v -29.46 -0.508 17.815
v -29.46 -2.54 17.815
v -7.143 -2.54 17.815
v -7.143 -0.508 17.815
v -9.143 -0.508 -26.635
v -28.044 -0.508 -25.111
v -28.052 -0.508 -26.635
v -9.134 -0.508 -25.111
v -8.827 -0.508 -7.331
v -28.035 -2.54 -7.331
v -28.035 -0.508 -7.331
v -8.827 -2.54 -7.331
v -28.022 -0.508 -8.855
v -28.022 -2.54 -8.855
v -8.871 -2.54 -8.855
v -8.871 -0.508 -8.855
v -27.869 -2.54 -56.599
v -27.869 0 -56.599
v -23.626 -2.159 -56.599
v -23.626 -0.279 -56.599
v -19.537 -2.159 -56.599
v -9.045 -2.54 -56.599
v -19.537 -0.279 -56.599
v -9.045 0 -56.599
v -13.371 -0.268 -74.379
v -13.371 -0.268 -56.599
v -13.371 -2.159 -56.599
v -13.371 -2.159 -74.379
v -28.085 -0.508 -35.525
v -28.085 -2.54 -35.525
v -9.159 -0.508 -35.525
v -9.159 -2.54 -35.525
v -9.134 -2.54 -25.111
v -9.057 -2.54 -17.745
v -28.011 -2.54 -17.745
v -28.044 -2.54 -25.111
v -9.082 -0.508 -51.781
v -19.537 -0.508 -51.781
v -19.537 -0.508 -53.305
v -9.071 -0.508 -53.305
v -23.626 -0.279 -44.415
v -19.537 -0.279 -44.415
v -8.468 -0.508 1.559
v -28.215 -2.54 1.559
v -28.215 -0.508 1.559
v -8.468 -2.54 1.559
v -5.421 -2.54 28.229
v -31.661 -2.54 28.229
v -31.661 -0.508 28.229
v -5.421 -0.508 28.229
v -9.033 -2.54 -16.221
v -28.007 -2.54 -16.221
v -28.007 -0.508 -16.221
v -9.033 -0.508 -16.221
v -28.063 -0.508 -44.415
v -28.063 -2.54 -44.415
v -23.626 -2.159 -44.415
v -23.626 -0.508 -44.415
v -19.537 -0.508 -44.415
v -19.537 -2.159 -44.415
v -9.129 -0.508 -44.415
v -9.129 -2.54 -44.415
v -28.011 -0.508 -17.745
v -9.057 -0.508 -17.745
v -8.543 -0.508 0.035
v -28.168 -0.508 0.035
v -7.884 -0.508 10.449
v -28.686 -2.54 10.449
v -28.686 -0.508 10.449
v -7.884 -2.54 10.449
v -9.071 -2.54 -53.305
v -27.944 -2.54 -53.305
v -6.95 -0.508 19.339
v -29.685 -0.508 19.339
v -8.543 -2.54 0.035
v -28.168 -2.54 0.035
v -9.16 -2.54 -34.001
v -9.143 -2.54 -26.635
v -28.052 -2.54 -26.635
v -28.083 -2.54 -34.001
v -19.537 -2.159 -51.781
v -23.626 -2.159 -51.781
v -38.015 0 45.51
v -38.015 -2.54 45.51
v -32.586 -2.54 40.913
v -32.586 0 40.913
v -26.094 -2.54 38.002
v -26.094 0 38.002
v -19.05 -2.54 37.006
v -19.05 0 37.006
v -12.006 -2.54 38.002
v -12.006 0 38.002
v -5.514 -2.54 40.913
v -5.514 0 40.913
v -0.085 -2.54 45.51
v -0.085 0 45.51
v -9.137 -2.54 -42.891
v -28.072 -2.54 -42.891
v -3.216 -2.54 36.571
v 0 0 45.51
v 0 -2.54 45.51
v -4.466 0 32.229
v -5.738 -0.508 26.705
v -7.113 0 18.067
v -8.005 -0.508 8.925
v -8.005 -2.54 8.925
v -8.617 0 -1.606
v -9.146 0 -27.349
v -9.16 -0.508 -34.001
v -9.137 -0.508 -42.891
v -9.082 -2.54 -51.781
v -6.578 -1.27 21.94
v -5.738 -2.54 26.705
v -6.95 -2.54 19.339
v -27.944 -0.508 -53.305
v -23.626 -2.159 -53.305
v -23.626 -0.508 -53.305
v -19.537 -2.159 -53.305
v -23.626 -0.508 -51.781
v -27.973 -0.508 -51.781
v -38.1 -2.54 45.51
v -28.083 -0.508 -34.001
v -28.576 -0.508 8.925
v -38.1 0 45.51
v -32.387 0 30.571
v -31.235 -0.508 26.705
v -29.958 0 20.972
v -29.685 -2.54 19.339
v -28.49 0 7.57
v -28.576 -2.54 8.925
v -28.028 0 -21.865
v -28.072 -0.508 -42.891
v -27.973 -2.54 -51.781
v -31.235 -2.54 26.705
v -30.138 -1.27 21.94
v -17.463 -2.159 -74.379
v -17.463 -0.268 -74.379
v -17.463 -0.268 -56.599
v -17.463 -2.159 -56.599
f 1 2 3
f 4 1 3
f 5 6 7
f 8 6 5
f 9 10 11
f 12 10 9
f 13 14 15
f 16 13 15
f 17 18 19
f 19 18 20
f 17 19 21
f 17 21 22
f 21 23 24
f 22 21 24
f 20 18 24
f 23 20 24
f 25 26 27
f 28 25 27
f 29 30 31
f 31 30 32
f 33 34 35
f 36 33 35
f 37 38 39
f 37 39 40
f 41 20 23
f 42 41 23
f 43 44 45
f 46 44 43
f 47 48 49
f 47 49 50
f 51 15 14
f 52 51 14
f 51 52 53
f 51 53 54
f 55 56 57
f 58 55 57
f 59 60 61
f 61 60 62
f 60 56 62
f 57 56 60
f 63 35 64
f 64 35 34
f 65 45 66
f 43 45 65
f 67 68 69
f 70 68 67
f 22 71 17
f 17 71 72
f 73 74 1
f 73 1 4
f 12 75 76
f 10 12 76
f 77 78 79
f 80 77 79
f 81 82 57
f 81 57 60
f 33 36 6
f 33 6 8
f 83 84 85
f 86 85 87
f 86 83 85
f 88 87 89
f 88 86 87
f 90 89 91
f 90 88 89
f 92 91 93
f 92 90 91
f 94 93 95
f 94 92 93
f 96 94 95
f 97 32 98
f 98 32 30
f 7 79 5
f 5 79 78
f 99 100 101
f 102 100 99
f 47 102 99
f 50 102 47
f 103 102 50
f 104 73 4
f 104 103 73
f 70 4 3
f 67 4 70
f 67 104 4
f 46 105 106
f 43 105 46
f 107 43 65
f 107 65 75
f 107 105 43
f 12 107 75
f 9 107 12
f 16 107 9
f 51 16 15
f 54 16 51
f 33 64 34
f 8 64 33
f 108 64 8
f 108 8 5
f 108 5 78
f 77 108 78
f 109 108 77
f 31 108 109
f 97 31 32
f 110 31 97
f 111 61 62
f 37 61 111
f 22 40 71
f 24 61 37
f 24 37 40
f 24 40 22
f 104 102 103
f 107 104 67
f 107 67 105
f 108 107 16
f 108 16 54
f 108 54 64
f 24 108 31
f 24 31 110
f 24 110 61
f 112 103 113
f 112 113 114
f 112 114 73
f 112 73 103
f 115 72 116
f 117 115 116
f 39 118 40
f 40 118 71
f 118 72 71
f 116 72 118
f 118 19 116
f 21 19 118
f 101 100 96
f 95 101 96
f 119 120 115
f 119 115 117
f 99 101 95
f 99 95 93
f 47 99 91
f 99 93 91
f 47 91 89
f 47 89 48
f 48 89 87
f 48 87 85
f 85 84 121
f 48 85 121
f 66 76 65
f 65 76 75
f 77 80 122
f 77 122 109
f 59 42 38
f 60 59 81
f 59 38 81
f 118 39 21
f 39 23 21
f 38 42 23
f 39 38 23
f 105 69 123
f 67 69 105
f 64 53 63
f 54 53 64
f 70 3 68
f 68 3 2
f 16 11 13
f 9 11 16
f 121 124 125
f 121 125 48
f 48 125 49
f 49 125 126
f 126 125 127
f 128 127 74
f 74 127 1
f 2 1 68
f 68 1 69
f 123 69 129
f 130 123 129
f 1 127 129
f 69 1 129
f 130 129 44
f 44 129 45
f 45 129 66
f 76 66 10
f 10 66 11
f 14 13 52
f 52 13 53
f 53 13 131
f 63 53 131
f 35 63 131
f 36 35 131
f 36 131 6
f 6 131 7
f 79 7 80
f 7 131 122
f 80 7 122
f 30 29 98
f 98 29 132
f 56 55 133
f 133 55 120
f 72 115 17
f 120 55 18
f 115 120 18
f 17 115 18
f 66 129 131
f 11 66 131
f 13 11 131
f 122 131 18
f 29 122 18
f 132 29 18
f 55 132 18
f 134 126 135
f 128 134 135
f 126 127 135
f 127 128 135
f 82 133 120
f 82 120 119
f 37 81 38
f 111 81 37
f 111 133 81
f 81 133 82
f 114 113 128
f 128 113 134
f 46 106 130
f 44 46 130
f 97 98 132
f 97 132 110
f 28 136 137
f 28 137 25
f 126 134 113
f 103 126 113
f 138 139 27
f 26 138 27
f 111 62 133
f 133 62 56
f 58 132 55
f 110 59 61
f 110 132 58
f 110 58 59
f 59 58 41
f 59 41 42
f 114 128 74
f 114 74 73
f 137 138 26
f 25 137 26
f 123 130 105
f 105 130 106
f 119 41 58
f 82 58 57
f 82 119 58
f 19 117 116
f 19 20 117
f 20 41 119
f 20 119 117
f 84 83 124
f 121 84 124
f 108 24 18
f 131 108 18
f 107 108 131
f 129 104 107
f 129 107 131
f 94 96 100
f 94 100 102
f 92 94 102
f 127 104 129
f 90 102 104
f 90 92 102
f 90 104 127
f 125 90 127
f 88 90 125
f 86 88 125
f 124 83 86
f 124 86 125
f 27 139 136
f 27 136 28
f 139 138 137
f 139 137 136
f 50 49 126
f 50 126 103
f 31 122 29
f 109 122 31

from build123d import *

# Parameters (mm, degrees)
F1_DEPTH = 2.54
F2_R     = 25.4
F3_DEPTH = 25.4
F4_W     = 41.0972163081
F4_H     = 1.524
F5_DEPTH = 2.032
F6_W     = 4.0921838954
F6_H     = 1.8910848594
F7_DEPTH = 17.78
F8_W     = 4.0894
F8_H     = 1.8796
F9_DEPTH = 12.183920388


with BuildPart() as f1:
    # F0 (on Front) → F1 (new body)
    with BuildSketch(Plane.XZ):
        with BuildLine():
            add(Edge.make_bspline(
                [(-38.1, 45.5098064329), (-31.48906723, 40.6018618943), (-18.4296945804, 30.9066072453), (-6.0920606717, 40.6826197932), (0, 45.5098064329)],
                knots=[0, 0, 0, 0, 0.506221313, 1, 1, 1, 1], degree=3))
            add(Edge.make_bspline(
                [(-38.1, 45.5098064329), (-35.7981584888, 38.8964609268), (-25.5149174178, 20.0096712829), (-28.6912827149, -24.7501280377), (-27.8687996008, -56.598869547)],
                knots=[0, 0, 0, 0, 0.3600810606, 1, 1, 1, 1], degree=3))
            Line((-27.8687996008, -56.598869547), (-9.0453229023, -56.598869547))
            add(Edge.make_bspline(
                [(0, 45.5098064329), (-2.5833212801, 38.9747758696), (-9.3977049962, 19.6461118957), (-9.3031082968, -24.5379434481), (-9.0453229023, -56.598869547)],
                knots=[0, 0, 0, 0, 0.3581705323, 1, 1, 1, 1], degree=3))
        make_face()
        with BuildLine():
            Line((0, 45.5098064329), (-38.1, 45.5098064329))
            add(Edge.make_bspline(
                [(-38.1, 45.5098064329), (-31.48906723, 40.6018618943), (-18.4296945804, 30.9066072453), (-6.0920606717, 40.6826197932), (0, 45.5098064329)],
                knots=[0, 0, 0, 0, 0.506221313, 1, 1, 1, 1], degree=3))
        make_face()
    extrude(amount=F1_DEPTH)

    # F2 (on Front) → F3 (cut)
    with BuildSketch(Plane.XZ):
        with Locations((-19.05, 62.4058693647)):
            Circle(F2_R)
    extrude(amount=F3_DEPTH, mode=Mode.SUBTRACT)

    # F4 (on face) → F5 (cut)
    with BuildSketch(Plane.XZ.offset(2.54)):
        with Locations((-18.3987691998, 27.467050841)):
            Rectangle(F4_W, F4_H)
        with Locations((-18.3987691998, 18.577050841)):
            Rectangle(F4_W, F4_H)
        with Locations((-18.3987691998, 9.687050841)):
            Rectangle(F4_W, F4_H)
        with Locations((-18.3987691998, 0.797050841)):
            Rectangle(F4_W, F4_H)
        with Locations((-18.3987691998, -8.092949159)):
            Rectangle(F4_W, F4_H)
        with Locations((-18.3987691998, -16.982949159)):
            Rectangle(F4_W, F4_H)
        with Locations((-18.3987691998, -25.872949159)):
            Rectangle(F4_W, F4_H)
        with Locations((-18.3987691998, -34.762949159)):
            Rectangle(F4_W, F4_H)
        with Locations((-18.3987691998, -43.652949159)):
            Rectangle(F4_W, F4_H)
        with Locations((-18.3987691998, -52.542949159)):
            Rectangle(F4_W, F4_H)
    extrude(amount=-F5_DEPTH, mode=Mode.SUBTRACT)

    # F8 (on face) → F9 (cut, through all)
    with BuildSketch(Plane(origin=(0, 0, -56.598869547), x_dir=(1, 0, 0), z_dir=(0, 0, -1))):
        with Locations((-21.5815627026, 1.2192)):
            Rectangle(F8_W, F8_H)
    extrude(amount=-F9_DEPTH, mode=Mode.SUBTRACT)


with BuildPart() as f7:
    # F6 (on face) → F7 (new body)
    with BuildSketch(Plane(origin=(0, 0, -56.598869547), x_dir=(1, 0, 0), z_dir=(0, 0, -1))):
        with Locations((-15.4168880545, 1.2134575703)):
            Rectangle(F6_W, F6_H)
    extrude(amount=F7_DEPTH)


solid = Compound([f1.part, f7.part])
